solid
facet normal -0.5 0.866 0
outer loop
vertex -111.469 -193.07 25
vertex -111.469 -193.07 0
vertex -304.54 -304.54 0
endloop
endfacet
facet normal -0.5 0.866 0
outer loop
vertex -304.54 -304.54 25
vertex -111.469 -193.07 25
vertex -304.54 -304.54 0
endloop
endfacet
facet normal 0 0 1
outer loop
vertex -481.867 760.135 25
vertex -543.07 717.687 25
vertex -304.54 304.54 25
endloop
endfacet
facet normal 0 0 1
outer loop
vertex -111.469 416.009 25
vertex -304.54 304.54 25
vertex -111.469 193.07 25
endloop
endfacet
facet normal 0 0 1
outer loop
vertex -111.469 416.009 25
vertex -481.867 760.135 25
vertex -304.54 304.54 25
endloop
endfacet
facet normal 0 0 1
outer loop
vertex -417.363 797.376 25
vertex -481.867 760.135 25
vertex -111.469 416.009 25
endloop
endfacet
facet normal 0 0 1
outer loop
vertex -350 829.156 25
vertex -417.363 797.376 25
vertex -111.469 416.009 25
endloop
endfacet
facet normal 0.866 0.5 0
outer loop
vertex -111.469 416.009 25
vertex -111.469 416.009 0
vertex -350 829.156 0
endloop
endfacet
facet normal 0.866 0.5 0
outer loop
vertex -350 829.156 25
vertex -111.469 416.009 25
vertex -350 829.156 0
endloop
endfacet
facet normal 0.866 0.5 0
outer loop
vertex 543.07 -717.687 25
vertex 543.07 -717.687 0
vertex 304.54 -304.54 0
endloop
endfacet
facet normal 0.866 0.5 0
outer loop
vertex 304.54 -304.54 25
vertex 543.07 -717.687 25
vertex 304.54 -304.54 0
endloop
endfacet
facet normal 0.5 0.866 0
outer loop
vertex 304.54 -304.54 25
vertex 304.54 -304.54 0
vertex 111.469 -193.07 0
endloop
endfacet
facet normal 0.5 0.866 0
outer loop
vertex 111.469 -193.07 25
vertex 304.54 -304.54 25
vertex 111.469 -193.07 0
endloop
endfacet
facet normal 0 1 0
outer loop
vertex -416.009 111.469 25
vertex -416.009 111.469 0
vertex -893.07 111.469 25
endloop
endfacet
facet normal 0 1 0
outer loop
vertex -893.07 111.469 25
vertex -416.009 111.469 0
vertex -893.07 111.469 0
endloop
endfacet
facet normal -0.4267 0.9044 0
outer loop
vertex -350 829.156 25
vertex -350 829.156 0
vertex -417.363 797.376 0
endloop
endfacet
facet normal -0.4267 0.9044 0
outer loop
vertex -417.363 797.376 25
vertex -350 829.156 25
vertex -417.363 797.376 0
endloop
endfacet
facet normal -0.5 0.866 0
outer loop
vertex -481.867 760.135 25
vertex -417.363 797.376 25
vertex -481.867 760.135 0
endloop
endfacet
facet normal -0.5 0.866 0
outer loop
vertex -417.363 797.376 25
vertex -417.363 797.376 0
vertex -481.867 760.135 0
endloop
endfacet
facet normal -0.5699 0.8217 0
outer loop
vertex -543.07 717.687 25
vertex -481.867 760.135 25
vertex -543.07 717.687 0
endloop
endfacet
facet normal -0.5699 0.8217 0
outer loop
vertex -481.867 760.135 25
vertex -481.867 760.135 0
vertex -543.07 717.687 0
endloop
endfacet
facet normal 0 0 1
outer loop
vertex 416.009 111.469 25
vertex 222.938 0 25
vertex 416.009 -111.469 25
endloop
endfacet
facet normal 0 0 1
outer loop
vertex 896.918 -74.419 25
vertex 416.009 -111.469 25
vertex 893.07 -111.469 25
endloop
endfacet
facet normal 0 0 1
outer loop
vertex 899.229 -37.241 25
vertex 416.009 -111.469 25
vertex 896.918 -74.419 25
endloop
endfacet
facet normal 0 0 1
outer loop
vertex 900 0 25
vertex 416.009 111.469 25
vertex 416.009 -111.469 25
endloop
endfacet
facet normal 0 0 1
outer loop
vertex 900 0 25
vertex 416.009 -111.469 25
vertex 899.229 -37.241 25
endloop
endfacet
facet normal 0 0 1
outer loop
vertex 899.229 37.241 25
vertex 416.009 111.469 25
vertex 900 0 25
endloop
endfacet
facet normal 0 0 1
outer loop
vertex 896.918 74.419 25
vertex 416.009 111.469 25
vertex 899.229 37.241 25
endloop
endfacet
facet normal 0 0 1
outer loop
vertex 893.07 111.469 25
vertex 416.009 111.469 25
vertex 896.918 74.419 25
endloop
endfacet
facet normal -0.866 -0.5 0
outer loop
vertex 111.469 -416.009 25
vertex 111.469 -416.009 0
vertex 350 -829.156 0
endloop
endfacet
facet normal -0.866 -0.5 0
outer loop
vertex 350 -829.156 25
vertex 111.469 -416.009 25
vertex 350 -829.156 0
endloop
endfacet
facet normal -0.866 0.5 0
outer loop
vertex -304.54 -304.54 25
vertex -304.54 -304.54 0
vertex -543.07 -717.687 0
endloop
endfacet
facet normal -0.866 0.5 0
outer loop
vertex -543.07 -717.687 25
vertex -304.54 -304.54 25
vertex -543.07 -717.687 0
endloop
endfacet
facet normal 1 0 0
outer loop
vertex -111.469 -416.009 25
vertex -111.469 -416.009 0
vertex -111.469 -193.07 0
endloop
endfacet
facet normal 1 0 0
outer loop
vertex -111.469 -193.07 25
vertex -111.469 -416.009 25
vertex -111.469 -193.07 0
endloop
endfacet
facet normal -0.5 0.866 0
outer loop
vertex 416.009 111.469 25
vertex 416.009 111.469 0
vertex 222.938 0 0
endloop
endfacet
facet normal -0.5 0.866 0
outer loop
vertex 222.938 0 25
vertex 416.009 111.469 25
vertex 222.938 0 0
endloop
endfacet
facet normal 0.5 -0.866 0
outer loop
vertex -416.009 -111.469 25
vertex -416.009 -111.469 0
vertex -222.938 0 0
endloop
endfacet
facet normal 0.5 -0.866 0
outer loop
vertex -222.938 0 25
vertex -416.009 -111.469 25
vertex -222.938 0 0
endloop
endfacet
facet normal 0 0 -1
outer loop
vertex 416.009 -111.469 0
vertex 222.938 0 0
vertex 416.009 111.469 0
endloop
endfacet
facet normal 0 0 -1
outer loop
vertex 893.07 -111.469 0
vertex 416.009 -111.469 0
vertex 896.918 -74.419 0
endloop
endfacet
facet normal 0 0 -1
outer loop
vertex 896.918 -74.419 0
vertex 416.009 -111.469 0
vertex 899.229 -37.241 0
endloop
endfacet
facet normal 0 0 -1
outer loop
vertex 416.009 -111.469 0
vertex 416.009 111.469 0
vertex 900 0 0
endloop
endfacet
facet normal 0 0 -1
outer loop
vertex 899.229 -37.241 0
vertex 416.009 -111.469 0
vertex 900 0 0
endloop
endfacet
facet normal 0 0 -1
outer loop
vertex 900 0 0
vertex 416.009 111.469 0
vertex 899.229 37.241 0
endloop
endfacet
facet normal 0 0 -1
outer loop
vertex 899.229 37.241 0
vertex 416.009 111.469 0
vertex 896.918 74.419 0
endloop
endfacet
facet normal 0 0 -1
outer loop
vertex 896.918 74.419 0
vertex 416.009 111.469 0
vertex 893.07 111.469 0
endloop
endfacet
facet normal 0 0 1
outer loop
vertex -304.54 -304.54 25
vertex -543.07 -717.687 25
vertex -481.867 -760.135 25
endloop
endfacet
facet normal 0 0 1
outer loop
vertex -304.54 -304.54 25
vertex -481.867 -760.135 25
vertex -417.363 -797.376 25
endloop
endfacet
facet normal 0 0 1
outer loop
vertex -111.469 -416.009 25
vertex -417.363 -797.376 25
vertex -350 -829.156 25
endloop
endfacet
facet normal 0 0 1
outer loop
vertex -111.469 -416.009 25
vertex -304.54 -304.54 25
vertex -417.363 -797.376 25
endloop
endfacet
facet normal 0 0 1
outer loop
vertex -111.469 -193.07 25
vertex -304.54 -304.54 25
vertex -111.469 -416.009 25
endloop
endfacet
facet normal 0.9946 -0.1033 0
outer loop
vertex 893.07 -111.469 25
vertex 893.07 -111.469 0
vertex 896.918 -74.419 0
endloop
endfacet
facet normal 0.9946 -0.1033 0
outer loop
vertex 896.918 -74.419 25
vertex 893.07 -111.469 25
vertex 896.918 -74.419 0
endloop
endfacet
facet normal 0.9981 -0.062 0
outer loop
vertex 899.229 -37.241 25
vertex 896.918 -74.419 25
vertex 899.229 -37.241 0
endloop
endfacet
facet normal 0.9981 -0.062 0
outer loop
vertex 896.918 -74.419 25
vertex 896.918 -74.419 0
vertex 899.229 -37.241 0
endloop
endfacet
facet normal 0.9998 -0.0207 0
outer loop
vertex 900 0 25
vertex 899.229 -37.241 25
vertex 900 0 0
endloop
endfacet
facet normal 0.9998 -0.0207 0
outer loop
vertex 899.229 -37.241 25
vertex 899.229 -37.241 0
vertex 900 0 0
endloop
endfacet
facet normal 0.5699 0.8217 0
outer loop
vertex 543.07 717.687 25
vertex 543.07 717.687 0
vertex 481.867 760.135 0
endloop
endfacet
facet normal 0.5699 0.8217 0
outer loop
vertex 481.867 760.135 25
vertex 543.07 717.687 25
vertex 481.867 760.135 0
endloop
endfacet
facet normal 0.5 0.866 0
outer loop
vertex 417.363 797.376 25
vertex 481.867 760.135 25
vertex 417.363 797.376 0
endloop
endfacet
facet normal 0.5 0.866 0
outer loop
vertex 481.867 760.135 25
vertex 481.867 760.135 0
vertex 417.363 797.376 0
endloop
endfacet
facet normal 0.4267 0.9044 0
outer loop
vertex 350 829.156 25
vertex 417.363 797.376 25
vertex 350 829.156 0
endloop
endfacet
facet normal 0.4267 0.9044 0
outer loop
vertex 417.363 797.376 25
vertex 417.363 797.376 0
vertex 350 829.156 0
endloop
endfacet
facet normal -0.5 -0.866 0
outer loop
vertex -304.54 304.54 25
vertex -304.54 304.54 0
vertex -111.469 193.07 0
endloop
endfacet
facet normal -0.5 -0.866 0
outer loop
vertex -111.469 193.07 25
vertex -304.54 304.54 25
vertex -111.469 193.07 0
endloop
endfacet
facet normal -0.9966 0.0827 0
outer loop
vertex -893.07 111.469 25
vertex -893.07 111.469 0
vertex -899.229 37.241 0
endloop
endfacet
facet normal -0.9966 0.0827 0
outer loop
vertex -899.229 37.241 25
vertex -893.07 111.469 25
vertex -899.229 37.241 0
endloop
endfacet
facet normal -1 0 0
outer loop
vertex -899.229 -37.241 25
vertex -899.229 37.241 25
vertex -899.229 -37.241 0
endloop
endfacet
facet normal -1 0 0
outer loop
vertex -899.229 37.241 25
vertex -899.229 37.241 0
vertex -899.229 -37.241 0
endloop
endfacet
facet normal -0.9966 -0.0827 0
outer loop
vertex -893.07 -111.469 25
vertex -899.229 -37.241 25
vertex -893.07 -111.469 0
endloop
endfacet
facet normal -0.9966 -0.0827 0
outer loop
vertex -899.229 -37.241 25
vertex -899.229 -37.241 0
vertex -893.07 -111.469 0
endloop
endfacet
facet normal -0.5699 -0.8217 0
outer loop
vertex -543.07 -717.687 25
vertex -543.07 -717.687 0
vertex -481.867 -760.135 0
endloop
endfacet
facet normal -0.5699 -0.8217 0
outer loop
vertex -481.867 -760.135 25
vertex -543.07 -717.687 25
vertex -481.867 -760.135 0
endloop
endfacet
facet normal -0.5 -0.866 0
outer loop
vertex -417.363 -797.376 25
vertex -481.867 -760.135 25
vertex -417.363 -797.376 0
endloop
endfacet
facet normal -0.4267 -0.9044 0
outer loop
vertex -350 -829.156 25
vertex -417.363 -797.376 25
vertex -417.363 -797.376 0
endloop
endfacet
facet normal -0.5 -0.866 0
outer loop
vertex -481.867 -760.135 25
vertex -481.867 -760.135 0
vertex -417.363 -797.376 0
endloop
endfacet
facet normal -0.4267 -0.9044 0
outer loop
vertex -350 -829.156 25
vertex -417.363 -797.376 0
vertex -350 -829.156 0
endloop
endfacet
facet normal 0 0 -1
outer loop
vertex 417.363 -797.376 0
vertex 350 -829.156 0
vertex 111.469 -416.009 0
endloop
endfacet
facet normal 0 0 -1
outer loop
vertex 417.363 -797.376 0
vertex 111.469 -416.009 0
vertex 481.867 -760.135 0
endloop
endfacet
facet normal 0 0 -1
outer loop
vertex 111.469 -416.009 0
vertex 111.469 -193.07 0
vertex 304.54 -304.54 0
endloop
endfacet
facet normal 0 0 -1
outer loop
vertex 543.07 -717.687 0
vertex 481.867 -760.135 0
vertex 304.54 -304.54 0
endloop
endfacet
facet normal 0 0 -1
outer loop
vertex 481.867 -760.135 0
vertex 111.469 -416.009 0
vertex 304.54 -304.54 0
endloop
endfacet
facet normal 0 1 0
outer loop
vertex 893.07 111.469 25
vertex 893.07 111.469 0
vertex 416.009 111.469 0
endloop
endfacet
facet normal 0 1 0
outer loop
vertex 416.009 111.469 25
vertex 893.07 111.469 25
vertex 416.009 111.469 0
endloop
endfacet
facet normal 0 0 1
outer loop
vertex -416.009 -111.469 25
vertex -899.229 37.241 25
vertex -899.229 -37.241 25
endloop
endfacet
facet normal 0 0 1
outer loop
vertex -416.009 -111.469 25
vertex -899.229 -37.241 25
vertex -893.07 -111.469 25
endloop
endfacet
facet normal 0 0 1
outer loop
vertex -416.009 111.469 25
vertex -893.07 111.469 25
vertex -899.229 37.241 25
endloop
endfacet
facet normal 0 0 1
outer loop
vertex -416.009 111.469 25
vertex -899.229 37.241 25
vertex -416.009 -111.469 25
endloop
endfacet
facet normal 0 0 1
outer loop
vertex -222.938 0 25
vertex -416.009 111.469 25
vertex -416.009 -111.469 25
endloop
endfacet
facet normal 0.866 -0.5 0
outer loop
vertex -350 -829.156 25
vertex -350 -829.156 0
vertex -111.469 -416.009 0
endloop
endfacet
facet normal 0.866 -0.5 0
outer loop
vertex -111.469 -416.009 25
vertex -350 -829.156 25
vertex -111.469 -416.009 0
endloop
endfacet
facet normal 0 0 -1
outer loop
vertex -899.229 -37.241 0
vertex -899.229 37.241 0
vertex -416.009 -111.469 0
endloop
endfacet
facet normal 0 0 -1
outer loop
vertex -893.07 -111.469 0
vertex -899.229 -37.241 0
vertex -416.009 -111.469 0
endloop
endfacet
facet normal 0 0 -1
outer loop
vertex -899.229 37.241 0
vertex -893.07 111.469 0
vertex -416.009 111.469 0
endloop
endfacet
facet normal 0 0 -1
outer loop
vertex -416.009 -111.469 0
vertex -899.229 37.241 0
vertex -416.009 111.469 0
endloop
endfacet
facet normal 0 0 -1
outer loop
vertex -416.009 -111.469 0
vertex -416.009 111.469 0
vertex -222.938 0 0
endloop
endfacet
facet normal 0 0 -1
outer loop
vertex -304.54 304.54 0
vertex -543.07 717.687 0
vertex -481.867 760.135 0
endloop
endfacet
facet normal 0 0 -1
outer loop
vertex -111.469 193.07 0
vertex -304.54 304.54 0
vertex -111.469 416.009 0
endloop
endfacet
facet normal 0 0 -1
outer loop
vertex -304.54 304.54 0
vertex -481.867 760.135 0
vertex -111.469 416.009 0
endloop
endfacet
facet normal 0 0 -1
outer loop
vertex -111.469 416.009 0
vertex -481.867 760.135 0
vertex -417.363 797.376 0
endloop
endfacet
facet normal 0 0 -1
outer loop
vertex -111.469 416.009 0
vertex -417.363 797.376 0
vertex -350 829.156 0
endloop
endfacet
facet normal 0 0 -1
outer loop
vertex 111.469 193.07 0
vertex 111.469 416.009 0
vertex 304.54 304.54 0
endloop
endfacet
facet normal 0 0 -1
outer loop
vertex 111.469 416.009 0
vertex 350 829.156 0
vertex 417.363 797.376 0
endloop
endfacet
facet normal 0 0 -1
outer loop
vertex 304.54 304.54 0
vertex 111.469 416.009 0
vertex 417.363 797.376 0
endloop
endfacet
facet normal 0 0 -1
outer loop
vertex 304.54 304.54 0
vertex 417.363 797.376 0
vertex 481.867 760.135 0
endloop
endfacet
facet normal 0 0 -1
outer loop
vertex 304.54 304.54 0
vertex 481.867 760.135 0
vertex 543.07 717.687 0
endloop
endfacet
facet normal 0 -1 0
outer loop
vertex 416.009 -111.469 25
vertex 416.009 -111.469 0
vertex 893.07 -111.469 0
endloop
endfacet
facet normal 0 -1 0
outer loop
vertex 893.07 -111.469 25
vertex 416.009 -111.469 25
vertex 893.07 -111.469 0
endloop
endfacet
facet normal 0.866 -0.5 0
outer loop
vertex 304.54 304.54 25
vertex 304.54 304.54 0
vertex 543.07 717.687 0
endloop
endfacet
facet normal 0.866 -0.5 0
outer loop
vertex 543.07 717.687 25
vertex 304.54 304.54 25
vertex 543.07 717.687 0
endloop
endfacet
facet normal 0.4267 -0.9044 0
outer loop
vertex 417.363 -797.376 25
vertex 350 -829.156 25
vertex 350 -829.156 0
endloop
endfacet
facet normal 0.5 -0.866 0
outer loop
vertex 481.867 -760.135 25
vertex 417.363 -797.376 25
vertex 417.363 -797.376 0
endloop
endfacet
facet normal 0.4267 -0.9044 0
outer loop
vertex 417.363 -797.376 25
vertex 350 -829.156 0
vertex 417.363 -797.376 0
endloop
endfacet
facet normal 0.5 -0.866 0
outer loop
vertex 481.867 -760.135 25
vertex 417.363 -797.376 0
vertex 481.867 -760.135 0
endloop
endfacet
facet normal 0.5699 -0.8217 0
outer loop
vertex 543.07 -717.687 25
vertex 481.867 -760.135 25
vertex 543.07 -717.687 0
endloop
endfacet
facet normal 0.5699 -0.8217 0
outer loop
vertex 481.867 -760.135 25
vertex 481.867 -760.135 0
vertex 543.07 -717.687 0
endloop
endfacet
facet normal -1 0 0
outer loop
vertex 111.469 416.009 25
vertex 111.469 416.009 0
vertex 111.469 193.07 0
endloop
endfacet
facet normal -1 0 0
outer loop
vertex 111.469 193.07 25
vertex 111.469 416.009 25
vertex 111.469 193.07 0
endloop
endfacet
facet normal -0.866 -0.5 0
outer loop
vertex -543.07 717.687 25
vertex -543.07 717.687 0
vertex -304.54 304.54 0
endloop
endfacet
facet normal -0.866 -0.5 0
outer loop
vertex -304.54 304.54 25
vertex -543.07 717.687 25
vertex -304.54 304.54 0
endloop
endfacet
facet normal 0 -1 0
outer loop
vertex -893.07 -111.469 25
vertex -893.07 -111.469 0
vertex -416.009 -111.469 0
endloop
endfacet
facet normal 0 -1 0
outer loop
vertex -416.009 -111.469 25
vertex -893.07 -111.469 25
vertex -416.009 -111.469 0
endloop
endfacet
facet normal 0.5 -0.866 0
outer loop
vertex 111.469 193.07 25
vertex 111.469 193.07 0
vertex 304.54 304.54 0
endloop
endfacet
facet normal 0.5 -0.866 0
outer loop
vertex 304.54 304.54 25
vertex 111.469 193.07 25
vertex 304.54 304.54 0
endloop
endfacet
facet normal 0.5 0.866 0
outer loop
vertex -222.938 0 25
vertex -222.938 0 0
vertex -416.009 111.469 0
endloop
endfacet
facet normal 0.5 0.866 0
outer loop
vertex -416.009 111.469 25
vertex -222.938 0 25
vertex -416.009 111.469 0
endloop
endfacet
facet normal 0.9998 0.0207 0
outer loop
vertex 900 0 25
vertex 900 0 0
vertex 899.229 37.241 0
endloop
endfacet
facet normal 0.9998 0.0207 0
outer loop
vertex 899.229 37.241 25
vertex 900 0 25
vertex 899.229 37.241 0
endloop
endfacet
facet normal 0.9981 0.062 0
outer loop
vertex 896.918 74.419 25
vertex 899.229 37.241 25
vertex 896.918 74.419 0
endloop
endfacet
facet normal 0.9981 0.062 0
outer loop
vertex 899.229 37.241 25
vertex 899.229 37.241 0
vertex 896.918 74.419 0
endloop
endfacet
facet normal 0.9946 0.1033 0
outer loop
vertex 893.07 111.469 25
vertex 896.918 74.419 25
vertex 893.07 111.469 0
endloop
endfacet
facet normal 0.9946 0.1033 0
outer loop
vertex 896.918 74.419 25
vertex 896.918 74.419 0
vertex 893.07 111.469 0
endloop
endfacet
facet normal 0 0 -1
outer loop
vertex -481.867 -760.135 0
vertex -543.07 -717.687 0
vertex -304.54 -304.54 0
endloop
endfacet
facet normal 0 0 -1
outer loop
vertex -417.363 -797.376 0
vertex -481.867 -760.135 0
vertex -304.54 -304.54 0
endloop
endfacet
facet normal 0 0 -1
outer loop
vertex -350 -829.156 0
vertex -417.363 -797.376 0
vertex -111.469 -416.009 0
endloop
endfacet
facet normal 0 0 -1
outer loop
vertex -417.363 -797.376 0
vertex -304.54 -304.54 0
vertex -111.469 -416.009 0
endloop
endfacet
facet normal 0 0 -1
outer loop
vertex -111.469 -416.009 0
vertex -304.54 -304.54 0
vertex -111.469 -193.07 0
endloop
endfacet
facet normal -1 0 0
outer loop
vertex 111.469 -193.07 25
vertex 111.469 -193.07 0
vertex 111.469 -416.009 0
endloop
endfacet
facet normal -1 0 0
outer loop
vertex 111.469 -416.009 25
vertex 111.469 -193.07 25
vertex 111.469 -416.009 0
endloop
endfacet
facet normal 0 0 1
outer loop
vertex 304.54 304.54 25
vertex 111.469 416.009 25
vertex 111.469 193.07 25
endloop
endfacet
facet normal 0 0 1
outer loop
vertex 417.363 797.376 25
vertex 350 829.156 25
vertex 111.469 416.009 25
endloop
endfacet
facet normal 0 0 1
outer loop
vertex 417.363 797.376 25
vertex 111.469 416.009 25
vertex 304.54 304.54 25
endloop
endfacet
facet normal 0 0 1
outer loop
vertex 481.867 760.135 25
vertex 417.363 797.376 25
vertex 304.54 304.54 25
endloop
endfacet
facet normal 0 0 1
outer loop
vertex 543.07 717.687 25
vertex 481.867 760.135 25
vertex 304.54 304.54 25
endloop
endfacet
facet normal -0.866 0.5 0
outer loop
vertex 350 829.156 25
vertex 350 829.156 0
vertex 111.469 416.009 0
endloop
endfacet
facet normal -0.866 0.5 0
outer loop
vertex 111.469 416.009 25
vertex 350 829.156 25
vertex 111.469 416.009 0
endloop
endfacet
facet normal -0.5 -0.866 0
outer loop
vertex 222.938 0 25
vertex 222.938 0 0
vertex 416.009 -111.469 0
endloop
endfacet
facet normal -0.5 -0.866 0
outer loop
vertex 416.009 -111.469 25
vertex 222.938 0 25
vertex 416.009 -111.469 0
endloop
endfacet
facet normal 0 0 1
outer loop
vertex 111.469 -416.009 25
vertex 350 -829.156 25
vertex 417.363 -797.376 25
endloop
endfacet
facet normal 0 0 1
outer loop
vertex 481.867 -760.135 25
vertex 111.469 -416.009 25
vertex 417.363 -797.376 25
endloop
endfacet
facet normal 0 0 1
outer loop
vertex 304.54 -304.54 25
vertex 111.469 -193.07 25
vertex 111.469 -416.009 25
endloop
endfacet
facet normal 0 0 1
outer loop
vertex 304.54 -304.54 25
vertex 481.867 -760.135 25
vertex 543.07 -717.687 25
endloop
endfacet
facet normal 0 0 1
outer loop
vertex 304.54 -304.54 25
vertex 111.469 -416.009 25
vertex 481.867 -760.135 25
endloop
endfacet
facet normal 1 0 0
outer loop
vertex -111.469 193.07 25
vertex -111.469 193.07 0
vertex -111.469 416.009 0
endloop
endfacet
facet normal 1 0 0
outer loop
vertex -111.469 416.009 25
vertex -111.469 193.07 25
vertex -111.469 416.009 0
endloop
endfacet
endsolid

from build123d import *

# Parameters (mm, degrees)
F1_DEPTH = 25


with BuildPart() as f1:
    # F0 (on Top) → F1 (new body)
    with BuildSketch(Plane.XY):
        with BuildLine():
            Line((-416.008745757, 111.46920747), (-691.0677360332, 111.46920747))
            ThreePointArc((-691.0677360332, 111.46920747), (-700, 1e-10), (-691.0677360332, -111.4692074698))
            Line((-691.0677360332, -111.4692074697), (-416.0087457571, -111.4692074698))
            Line((-416.0087457571, -111.4692074699), (-222.9384149397, 0))
            Line((-222.9384149397, 0), (-416.008745757, 111.4692074699))
        make_face()
        with BuildLine():
            ThreePointArc((-691.0677360332, -111.4692074698), (-700, 1e-10), (-691.0677360332, 111.46920747))
            Line((-691.0677360332, 111.46920747), (-893.0703308172, 111.46920747))
            ThreePointArc((-893.0703308172, 111.46920747), (-900, 1e-10), (-893.0703308173, -111.4692074697))
            Line((-893.0703308173, -111.4692074697), (-691.0677360332, -111.4692074697))
        make_face()
    extrude(amount=F1_DEPTH)


with BuildPart() as f1b:
    # F0 (on Top) → F1, piece 2 (new body)
    with BuildSketch(Plane.XY):
        with BuildLine():
            Line((-350.0000000004, -829.1561975887), (-248.9987026083, -654.2168188753))
            ThreePointArc((-248.9987026083, -654.2168188754), (-350.0000000003, -606.2177826489), (-442.0690334255, -542.7476114054))
            Line((-442.0690334255, -542.7476114054), (-543.0703308176, -717.6869901187))
            ThreePointArc((-543.0703308176, -717.6869901187), (-450.0000000003, -779.4228634058), (-350.0000000003, -829.1561975887))
        make_face()
        with BuildLine():
            ThreePointArc((-442.0690334255, -542.7476114054), (-350.0000000003, -606.2177826489), (-248.9987026083, -654.2168188754))
            Line((-248.9987026083, -654.2168188753), (-111.4692074702, -416.0087457569))
            Line((-111.4692074698, -416.0087457571), (-111.4692074699, -193.0703308173))
            Line((-111.4692074699, -193.0703308173), (-304.5395382871, -304.5395382871))
            Line((-304.5395382875, -304.539538287), (-442.0690334255, -542.7476114054))
        make_face()
    extrude(amount=F1_DEPTH)


with BuildPart() as f1c:
    # F0 (on Top) → F1, piece 3 (new body)
    with BuildSketch(Plane.XY):
        with BuildLine():
            ThreePointArc((248.9987026075, -654.2168188756), (349.9999999996, -606.2177826493), (442.0690334249, -542.7476114059))
            Line((442.0690334249, -542.7476114059), (304.5395382868, -304.5395382874))
            Line((304.5395382872, -304.5395382871), (111.4692074699, -193.0703308172))
            Line((111.4692074699, -193.0703308172), (111.4692074699, -416.008745757))
            Line((111.4692074695, -416.0087457572), (248.9987026075, -654.2168188756))
        make_face()
        with BuildLine():
            Line((543.0703308169, -717.6869901193), (442.0690334249, -542.7476114059))
            ThreePointArc((442.0690334249, -542.7476114059), (349.9999999996, -606.2177826493), (248.9987026075, -654.2168188756))
            Line((248.9987026075, -654.2168188756), (349.9999999996, -829.156197589))
            ThreePointArc((349.9999999996, -829.156197589), (449.9999999996, -779.4228634062), (543.0703308169, -717.6869901193))
        make_face()
    extrude(amount=F1_DEPTH)


with BuildPart() as f1d:
    # F0 (on Top) → F1, piece 4 (new body)
    with BuildSketch(Plane.XY):
        with BuildLine():
            ThreePointArc((691.0677360331, -111.4692074702), (697.7633607546, -55.9132577159), (700, 0))
            ThreePointArc((700, 0), (697.7633607547, 55.9132577156), (691.0677360332, 111.4692074696))
            Line((691.0677360332, 111.4692074696), (416.0087457571, 111.4692074696))
            Line((416.0087457571, 111.4692074699), (222.9384149397, 0))
            Line((222.9384149397, 0), (416.008745757, -111.4692074699))
            Line((416.008745757, -111.4692074702), (691.0677360331, -111.4692074702))
        make_face()
        with BuildLine():
            ThreePointArc((691.0677360332, 111.4692074696), (697.7633607547, 55.9132577156), (700, 0))
            ThreePointArc((700, 0), (697.7633607546, -55.9132577159), (691.0677360331, -111.4692074702))
            Line((691.0677360331, -111.4692074702), (893.0703308172, -111.4692074702))
            ThreePointArc((893.0703308172, -111.4692074702), (898.265912115, -55.8421984905), (900, 0))
            ThreePointArc((900, 0), (898.265912115, 55.8421984902), (893.0703308173, 111.4692074696))
            Line((893.0703308173, 111.4692074696), (691.0677360332, 111.4692074696))
        make_face()
    extrude(amount=F1_DEPTH)


with BuildPart() as f1e:
    # F0 (on Top) → F1, piece 5 (new body)
    with BuildSketch(Plane.XY):
        with BuildLine():
            Line((304.5395382872, 304.5395382871), (442.0690334253, 542.7476114056))
            ThreePointArc((442.0690334253, 542.7476114056), (350.0000000001, 606.2177826491), (248.998702608, 654.2168188755))
            Line((248.998702608, 654.2168188755), (111.4692074699, 416.008745757))
            Line((111.4692074698, 416.0087457571), (111.4692074699, 193.0703308173))
            Line((111.4692074699, 193.0703308173), (304.5395382871, 304.5395382871))
        make_face()
        with BuildLine():
            ThreePointArc((248.998702608, 654.2168188755), (350.0000000001, 606.2177826491), (442.0690334253, 542.7476114056))
            Line((442.0690334253, 542.7476114056), (543.0703308173, 717.6869901189))
            ThreePointArc((543.0703308173, 717.6869901189), (450.0000000001, 779.422863406), (350.0000000001, 829.1561975888))
            Line((350.0000000001, 829.1561975888), (248.998702608, 654.2168188755))
        make_face()
    extrude(amount=F1_DEPTH)


with BuildPart() as f1f:
    # F0 (on Top) → F1, piece 6 (new body)
    with BuildSketch(Plane.XY):
        with BuildLine():
            Line((-111.4692074699, 416.008745757), (-248.998702608, 654.2168188755))
            ThreePointArc((-248.998702608, 654.2168188755), (-350, 606.2177826491), (-442.0690334252, 542.7476114056))
            Line((-442.0690334252, 542.7476114056), (-304.5395382872, 304.5395382871))
            Line((-304.5395382872, 304.5395382871), (-111.4692074699, 193.0703308172))
            Line((-111.4692074699, 193.0703308172), (-111.4692074699, 416.008745757))
        make_face()
        with BuildLine():
            ThreePointArc((-442.0690334252, 542.7476114056), (-350, 606.2177826491), (-248.998702608, 654.2168188755))
            Line((-248.998702608, 654.2168188755), (-350, 829.1561975889))
            ThreePointArc((-350, 829.1561975888), (-450, 779.422863406), (-543.0703308172, 717.686990119))
            Line((-543.0703308173, 717.686990119), (-442.0690334252, 542.7476114056))
        make_face()
    extrude(amount=F1_DEPTH)


solid = Compound([f1.part, f1b.part, f1c.part, f1d.part, f1e.part, f1f.part])
